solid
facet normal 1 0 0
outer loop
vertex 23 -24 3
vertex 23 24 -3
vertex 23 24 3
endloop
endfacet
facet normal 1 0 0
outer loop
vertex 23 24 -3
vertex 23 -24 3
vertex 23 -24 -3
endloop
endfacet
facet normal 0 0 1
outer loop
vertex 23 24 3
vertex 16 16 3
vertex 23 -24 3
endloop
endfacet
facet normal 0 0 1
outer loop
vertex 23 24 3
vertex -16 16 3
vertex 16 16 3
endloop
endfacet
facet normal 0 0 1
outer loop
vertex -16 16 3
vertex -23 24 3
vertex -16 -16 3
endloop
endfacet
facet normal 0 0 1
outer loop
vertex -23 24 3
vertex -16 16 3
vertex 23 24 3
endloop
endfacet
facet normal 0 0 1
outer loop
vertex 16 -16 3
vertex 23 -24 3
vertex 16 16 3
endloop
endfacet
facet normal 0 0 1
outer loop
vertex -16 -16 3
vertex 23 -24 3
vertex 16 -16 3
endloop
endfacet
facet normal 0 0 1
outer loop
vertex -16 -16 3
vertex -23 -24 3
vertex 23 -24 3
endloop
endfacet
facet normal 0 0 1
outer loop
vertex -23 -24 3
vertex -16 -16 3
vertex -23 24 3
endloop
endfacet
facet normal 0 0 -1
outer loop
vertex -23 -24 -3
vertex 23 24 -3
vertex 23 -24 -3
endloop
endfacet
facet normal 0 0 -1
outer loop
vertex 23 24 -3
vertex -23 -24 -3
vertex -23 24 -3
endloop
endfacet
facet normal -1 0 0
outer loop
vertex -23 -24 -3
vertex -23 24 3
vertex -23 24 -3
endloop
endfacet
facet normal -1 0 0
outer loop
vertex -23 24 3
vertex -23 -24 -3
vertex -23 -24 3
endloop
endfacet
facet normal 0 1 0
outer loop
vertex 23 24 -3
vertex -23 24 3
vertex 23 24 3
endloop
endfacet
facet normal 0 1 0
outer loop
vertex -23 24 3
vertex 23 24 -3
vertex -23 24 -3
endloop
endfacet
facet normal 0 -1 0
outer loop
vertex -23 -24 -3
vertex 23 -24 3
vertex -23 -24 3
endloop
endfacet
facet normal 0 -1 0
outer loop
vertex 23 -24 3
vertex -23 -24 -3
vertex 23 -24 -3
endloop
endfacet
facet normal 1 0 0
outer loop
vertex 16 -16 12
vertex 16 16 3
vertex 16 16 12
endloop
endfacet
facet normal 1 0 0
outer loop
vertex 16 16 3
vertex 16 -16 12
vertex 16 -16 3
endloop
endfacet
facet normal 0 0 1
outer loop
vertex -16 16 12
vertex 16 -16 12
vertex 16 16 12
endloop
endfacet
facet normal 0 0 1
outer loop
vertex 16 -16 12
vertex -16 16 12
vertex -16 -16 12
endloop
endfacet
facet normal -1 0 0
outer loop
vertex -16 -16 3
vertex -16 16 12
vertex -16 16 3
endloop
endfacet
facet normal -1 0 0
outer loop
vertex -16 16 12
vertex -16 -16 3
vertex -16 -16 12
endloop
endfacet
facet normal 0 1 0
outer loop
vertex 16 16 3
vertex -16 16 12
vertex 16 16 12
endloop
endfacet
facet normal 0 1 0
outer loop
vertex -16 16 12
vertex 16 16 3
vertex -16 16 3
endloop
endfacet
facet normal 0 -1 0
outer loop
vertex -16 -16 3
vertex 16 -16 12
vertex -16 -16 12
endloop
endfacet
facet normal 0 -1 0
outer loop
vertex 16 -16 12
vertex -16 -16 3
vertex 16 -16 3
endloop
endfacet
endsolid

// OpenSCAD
dims = [46, 48, 6];

cube(dims,center=true);
translate([0,0,6])cube([32, 32, 12],center=true);

  
